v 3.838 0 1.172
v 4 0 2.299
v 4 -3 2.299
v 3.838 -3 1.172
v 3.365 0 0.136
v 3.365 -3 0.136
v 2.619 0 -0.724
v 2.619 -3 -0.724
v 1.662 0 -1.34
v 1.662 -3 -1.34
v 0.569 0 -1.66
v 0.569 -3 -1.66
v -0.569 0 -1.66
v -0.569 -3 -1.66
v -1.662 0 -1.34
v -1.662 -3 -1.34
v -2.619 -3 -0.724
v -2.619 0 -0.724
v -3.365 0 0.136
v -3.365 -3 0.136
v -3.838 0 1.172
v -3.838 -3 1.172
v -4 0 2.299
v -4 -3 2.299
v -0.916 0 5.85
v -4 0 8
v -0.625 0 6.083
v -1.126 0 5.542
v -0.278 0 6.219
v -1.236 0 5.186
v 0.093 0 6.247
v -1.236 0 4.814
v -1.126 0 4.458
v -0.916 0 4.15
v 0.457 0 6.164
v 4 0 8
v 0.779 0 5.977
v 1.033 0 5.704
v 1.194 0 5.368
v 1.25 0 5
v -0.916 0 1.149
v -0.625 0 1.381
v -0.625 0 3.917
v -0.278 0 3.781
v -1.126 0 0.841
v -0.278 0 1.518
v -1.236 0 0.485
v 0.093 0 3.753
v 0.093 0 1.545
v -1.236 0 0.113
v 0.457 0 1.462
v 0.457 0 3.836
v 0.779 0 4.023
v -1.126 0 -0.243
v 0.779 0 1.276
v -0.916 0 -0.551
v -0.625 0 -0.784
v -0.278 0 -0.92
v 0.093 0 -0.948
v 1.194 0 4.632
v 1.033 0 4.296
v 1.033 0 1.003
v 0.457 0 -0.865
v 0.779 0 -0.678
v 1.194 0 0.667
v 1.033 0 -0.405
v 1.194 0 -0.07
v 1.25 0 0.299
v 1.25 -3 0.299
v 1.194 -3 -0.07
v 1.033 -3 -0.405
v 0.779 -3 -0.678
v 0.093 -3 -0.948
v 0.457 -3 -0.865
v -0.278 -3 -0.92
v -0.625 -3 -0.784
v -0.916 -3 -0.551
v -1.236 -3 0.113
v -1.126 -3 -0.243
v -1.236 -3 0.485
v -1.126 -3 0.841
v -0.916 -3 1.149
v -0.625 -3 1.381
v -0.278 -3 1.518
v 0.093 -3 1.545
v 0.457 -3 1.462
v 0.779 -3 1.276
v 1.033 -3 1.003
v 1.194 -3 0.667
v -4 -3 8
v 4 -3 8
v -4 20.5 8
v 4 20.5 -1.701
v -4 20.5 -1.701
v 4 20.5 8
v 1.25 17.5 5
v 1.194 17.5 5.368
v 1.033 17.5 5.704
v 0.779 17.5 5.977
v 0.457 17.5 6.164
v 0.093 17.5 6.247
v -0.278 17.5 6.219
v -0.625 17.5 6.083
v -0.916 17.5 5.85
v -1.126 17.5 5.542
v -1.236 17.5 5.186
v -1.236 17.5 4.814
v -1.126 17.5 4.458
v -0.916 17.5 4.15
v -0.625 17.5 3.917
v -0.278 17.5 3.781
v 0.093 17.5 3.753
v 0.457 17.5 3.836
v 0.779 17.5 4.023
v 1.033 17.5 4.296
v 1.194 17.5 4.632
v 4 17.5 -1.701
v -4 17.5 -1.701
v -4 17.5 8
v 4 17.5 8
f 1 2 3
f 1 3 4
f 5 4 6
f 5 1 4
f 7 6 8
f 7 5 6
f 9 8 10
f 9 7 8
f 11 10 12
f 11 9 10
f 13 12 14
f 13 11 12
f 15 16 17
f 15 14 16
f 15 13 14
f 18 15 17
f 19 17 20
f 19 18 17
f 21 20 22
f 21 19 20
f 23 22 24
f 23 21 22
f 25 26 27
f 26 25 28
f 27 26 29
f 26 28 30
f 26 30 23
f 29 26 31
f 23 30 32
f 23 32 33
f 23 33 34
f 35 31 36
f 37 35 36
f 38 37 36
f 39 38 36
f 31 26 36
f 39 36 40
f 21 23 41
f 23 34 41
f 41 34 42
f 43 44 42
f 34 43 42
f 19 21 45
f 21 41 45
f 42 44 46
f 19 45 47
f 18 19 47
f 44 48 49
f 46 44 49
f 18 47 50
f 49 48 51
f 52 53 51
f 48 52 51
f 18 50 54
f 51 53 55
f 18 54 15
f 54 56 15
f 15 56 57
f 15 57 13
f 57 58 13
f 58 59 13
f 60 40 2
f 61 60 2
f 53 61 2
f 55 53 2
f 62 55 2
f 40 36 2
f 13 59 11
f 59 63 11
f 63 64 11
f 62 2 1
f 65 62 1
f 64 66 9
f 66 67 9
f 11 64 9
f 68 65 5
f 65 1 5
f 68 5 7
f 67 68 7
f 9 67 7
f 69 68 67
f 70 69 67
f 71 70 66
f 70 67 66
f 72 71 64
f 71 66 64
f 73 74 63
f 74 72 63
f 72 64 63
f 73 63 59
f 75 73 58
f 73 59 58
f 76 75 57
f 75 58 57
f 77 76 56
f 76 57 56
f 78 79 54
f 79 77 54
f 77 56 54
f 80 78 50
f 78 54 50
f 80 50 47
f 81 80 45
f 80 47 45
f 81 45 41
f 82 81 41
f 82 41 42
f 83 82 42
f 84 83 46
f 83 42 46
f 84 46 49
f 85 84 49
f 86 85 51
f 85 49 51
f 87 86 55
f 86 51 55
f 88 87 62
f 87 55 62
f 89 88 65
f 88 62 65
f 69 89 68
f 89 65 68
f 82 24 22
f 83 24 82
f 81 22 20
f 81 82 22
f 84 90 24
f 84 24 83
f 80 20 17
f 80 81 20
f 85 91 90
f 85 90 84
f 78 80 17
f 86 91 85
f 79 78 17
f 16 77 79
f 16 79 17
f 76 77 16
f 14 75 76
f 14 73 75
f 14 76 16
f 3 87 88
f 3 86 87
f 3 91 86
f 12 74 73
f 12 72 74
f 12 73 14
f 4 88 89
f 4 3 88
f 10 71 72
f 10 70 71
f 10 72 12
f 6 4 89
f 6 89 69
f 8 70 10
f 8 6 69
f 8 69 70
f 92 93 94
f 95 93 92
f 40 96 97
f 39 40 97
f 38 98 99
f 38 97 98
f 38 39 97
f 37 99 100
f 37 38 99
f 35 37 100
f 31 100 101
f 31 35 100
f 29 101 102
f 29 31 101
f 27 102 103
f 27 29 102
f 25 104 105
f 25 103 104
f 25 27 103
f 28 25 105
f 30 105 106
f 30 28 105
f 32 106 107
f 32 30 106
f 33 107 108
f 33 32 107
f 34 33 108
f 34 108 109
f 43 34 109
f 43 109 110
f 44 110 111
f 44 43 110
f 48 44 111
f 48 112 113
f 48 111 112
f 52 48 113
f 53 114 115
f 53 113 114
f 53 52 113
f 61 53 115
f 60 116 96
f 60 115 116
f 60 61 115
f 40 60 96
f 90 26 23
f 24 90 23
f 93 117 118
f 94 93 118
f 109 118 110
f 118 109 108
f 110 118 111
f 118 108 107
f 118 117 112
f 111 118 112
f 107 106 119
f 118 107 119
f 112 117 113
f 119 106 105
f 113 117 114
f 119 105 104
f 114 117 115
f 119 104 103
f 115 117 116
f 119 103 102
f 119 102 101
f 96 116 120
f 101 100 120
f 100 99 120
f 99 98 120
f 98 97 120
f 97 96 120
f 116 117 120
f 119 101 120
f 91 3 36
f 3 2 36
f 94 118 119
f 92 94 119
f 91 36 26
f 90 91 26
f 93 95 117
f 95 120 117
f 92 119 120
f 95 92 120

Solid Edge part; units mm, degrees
sketch "Sketch1" plane through (0, 0, 0) normal (0, -1, 0) x (1, 0, 0)
  circle A0 centre (0, 0.2989) radius 1.25
  line L0 (-4, 8) -> (-4, 2.2989)
  line L1 (4, 2.2989) -> (4, 8)
  line L2 (4, 8) -> (-4, 8)
  arc A1 (-4, 2.2989) -> (4, 2.2989) centre (0, 2.2989) ccw
  dimension "D1" = 8
  dimension "D2" = 5.7011
  dimension "D3" = 4
  dimension "D4" = 2.5
  dimension "D5" = 2
extrude "Protrusion1" add sketch "Sketch1" along normal blind 3
sketch "Sketch2" plane through (0, 0, 3.1494) normal (0, 1, 0) x (1, 0, 0)
  circle A0 centre (0, -1.8506) radius 1.25
  dimension "D1" = 2.5
  dimension "D2" = 3
extrude "ExtrudedProtrusion_2" add sketch "Sketch2" along normal blind 17.5
sketch "Sketch3" plane through (0, 17.5, 5) normal (0, 1, 0) x (0, 0, -1)
  line L0 (-3, -4) -> (6.7011, -4)
  line L1 (6.7011, -4) -> (6.7011, 4)
  line L2 (6.7011, 4) -> (-3, 4)
  line L3 (-3, 4) -> (-3, -4)
extrude "ExtrudedProtrusion_3" add sketch "Sketch3" along normal blind 3
